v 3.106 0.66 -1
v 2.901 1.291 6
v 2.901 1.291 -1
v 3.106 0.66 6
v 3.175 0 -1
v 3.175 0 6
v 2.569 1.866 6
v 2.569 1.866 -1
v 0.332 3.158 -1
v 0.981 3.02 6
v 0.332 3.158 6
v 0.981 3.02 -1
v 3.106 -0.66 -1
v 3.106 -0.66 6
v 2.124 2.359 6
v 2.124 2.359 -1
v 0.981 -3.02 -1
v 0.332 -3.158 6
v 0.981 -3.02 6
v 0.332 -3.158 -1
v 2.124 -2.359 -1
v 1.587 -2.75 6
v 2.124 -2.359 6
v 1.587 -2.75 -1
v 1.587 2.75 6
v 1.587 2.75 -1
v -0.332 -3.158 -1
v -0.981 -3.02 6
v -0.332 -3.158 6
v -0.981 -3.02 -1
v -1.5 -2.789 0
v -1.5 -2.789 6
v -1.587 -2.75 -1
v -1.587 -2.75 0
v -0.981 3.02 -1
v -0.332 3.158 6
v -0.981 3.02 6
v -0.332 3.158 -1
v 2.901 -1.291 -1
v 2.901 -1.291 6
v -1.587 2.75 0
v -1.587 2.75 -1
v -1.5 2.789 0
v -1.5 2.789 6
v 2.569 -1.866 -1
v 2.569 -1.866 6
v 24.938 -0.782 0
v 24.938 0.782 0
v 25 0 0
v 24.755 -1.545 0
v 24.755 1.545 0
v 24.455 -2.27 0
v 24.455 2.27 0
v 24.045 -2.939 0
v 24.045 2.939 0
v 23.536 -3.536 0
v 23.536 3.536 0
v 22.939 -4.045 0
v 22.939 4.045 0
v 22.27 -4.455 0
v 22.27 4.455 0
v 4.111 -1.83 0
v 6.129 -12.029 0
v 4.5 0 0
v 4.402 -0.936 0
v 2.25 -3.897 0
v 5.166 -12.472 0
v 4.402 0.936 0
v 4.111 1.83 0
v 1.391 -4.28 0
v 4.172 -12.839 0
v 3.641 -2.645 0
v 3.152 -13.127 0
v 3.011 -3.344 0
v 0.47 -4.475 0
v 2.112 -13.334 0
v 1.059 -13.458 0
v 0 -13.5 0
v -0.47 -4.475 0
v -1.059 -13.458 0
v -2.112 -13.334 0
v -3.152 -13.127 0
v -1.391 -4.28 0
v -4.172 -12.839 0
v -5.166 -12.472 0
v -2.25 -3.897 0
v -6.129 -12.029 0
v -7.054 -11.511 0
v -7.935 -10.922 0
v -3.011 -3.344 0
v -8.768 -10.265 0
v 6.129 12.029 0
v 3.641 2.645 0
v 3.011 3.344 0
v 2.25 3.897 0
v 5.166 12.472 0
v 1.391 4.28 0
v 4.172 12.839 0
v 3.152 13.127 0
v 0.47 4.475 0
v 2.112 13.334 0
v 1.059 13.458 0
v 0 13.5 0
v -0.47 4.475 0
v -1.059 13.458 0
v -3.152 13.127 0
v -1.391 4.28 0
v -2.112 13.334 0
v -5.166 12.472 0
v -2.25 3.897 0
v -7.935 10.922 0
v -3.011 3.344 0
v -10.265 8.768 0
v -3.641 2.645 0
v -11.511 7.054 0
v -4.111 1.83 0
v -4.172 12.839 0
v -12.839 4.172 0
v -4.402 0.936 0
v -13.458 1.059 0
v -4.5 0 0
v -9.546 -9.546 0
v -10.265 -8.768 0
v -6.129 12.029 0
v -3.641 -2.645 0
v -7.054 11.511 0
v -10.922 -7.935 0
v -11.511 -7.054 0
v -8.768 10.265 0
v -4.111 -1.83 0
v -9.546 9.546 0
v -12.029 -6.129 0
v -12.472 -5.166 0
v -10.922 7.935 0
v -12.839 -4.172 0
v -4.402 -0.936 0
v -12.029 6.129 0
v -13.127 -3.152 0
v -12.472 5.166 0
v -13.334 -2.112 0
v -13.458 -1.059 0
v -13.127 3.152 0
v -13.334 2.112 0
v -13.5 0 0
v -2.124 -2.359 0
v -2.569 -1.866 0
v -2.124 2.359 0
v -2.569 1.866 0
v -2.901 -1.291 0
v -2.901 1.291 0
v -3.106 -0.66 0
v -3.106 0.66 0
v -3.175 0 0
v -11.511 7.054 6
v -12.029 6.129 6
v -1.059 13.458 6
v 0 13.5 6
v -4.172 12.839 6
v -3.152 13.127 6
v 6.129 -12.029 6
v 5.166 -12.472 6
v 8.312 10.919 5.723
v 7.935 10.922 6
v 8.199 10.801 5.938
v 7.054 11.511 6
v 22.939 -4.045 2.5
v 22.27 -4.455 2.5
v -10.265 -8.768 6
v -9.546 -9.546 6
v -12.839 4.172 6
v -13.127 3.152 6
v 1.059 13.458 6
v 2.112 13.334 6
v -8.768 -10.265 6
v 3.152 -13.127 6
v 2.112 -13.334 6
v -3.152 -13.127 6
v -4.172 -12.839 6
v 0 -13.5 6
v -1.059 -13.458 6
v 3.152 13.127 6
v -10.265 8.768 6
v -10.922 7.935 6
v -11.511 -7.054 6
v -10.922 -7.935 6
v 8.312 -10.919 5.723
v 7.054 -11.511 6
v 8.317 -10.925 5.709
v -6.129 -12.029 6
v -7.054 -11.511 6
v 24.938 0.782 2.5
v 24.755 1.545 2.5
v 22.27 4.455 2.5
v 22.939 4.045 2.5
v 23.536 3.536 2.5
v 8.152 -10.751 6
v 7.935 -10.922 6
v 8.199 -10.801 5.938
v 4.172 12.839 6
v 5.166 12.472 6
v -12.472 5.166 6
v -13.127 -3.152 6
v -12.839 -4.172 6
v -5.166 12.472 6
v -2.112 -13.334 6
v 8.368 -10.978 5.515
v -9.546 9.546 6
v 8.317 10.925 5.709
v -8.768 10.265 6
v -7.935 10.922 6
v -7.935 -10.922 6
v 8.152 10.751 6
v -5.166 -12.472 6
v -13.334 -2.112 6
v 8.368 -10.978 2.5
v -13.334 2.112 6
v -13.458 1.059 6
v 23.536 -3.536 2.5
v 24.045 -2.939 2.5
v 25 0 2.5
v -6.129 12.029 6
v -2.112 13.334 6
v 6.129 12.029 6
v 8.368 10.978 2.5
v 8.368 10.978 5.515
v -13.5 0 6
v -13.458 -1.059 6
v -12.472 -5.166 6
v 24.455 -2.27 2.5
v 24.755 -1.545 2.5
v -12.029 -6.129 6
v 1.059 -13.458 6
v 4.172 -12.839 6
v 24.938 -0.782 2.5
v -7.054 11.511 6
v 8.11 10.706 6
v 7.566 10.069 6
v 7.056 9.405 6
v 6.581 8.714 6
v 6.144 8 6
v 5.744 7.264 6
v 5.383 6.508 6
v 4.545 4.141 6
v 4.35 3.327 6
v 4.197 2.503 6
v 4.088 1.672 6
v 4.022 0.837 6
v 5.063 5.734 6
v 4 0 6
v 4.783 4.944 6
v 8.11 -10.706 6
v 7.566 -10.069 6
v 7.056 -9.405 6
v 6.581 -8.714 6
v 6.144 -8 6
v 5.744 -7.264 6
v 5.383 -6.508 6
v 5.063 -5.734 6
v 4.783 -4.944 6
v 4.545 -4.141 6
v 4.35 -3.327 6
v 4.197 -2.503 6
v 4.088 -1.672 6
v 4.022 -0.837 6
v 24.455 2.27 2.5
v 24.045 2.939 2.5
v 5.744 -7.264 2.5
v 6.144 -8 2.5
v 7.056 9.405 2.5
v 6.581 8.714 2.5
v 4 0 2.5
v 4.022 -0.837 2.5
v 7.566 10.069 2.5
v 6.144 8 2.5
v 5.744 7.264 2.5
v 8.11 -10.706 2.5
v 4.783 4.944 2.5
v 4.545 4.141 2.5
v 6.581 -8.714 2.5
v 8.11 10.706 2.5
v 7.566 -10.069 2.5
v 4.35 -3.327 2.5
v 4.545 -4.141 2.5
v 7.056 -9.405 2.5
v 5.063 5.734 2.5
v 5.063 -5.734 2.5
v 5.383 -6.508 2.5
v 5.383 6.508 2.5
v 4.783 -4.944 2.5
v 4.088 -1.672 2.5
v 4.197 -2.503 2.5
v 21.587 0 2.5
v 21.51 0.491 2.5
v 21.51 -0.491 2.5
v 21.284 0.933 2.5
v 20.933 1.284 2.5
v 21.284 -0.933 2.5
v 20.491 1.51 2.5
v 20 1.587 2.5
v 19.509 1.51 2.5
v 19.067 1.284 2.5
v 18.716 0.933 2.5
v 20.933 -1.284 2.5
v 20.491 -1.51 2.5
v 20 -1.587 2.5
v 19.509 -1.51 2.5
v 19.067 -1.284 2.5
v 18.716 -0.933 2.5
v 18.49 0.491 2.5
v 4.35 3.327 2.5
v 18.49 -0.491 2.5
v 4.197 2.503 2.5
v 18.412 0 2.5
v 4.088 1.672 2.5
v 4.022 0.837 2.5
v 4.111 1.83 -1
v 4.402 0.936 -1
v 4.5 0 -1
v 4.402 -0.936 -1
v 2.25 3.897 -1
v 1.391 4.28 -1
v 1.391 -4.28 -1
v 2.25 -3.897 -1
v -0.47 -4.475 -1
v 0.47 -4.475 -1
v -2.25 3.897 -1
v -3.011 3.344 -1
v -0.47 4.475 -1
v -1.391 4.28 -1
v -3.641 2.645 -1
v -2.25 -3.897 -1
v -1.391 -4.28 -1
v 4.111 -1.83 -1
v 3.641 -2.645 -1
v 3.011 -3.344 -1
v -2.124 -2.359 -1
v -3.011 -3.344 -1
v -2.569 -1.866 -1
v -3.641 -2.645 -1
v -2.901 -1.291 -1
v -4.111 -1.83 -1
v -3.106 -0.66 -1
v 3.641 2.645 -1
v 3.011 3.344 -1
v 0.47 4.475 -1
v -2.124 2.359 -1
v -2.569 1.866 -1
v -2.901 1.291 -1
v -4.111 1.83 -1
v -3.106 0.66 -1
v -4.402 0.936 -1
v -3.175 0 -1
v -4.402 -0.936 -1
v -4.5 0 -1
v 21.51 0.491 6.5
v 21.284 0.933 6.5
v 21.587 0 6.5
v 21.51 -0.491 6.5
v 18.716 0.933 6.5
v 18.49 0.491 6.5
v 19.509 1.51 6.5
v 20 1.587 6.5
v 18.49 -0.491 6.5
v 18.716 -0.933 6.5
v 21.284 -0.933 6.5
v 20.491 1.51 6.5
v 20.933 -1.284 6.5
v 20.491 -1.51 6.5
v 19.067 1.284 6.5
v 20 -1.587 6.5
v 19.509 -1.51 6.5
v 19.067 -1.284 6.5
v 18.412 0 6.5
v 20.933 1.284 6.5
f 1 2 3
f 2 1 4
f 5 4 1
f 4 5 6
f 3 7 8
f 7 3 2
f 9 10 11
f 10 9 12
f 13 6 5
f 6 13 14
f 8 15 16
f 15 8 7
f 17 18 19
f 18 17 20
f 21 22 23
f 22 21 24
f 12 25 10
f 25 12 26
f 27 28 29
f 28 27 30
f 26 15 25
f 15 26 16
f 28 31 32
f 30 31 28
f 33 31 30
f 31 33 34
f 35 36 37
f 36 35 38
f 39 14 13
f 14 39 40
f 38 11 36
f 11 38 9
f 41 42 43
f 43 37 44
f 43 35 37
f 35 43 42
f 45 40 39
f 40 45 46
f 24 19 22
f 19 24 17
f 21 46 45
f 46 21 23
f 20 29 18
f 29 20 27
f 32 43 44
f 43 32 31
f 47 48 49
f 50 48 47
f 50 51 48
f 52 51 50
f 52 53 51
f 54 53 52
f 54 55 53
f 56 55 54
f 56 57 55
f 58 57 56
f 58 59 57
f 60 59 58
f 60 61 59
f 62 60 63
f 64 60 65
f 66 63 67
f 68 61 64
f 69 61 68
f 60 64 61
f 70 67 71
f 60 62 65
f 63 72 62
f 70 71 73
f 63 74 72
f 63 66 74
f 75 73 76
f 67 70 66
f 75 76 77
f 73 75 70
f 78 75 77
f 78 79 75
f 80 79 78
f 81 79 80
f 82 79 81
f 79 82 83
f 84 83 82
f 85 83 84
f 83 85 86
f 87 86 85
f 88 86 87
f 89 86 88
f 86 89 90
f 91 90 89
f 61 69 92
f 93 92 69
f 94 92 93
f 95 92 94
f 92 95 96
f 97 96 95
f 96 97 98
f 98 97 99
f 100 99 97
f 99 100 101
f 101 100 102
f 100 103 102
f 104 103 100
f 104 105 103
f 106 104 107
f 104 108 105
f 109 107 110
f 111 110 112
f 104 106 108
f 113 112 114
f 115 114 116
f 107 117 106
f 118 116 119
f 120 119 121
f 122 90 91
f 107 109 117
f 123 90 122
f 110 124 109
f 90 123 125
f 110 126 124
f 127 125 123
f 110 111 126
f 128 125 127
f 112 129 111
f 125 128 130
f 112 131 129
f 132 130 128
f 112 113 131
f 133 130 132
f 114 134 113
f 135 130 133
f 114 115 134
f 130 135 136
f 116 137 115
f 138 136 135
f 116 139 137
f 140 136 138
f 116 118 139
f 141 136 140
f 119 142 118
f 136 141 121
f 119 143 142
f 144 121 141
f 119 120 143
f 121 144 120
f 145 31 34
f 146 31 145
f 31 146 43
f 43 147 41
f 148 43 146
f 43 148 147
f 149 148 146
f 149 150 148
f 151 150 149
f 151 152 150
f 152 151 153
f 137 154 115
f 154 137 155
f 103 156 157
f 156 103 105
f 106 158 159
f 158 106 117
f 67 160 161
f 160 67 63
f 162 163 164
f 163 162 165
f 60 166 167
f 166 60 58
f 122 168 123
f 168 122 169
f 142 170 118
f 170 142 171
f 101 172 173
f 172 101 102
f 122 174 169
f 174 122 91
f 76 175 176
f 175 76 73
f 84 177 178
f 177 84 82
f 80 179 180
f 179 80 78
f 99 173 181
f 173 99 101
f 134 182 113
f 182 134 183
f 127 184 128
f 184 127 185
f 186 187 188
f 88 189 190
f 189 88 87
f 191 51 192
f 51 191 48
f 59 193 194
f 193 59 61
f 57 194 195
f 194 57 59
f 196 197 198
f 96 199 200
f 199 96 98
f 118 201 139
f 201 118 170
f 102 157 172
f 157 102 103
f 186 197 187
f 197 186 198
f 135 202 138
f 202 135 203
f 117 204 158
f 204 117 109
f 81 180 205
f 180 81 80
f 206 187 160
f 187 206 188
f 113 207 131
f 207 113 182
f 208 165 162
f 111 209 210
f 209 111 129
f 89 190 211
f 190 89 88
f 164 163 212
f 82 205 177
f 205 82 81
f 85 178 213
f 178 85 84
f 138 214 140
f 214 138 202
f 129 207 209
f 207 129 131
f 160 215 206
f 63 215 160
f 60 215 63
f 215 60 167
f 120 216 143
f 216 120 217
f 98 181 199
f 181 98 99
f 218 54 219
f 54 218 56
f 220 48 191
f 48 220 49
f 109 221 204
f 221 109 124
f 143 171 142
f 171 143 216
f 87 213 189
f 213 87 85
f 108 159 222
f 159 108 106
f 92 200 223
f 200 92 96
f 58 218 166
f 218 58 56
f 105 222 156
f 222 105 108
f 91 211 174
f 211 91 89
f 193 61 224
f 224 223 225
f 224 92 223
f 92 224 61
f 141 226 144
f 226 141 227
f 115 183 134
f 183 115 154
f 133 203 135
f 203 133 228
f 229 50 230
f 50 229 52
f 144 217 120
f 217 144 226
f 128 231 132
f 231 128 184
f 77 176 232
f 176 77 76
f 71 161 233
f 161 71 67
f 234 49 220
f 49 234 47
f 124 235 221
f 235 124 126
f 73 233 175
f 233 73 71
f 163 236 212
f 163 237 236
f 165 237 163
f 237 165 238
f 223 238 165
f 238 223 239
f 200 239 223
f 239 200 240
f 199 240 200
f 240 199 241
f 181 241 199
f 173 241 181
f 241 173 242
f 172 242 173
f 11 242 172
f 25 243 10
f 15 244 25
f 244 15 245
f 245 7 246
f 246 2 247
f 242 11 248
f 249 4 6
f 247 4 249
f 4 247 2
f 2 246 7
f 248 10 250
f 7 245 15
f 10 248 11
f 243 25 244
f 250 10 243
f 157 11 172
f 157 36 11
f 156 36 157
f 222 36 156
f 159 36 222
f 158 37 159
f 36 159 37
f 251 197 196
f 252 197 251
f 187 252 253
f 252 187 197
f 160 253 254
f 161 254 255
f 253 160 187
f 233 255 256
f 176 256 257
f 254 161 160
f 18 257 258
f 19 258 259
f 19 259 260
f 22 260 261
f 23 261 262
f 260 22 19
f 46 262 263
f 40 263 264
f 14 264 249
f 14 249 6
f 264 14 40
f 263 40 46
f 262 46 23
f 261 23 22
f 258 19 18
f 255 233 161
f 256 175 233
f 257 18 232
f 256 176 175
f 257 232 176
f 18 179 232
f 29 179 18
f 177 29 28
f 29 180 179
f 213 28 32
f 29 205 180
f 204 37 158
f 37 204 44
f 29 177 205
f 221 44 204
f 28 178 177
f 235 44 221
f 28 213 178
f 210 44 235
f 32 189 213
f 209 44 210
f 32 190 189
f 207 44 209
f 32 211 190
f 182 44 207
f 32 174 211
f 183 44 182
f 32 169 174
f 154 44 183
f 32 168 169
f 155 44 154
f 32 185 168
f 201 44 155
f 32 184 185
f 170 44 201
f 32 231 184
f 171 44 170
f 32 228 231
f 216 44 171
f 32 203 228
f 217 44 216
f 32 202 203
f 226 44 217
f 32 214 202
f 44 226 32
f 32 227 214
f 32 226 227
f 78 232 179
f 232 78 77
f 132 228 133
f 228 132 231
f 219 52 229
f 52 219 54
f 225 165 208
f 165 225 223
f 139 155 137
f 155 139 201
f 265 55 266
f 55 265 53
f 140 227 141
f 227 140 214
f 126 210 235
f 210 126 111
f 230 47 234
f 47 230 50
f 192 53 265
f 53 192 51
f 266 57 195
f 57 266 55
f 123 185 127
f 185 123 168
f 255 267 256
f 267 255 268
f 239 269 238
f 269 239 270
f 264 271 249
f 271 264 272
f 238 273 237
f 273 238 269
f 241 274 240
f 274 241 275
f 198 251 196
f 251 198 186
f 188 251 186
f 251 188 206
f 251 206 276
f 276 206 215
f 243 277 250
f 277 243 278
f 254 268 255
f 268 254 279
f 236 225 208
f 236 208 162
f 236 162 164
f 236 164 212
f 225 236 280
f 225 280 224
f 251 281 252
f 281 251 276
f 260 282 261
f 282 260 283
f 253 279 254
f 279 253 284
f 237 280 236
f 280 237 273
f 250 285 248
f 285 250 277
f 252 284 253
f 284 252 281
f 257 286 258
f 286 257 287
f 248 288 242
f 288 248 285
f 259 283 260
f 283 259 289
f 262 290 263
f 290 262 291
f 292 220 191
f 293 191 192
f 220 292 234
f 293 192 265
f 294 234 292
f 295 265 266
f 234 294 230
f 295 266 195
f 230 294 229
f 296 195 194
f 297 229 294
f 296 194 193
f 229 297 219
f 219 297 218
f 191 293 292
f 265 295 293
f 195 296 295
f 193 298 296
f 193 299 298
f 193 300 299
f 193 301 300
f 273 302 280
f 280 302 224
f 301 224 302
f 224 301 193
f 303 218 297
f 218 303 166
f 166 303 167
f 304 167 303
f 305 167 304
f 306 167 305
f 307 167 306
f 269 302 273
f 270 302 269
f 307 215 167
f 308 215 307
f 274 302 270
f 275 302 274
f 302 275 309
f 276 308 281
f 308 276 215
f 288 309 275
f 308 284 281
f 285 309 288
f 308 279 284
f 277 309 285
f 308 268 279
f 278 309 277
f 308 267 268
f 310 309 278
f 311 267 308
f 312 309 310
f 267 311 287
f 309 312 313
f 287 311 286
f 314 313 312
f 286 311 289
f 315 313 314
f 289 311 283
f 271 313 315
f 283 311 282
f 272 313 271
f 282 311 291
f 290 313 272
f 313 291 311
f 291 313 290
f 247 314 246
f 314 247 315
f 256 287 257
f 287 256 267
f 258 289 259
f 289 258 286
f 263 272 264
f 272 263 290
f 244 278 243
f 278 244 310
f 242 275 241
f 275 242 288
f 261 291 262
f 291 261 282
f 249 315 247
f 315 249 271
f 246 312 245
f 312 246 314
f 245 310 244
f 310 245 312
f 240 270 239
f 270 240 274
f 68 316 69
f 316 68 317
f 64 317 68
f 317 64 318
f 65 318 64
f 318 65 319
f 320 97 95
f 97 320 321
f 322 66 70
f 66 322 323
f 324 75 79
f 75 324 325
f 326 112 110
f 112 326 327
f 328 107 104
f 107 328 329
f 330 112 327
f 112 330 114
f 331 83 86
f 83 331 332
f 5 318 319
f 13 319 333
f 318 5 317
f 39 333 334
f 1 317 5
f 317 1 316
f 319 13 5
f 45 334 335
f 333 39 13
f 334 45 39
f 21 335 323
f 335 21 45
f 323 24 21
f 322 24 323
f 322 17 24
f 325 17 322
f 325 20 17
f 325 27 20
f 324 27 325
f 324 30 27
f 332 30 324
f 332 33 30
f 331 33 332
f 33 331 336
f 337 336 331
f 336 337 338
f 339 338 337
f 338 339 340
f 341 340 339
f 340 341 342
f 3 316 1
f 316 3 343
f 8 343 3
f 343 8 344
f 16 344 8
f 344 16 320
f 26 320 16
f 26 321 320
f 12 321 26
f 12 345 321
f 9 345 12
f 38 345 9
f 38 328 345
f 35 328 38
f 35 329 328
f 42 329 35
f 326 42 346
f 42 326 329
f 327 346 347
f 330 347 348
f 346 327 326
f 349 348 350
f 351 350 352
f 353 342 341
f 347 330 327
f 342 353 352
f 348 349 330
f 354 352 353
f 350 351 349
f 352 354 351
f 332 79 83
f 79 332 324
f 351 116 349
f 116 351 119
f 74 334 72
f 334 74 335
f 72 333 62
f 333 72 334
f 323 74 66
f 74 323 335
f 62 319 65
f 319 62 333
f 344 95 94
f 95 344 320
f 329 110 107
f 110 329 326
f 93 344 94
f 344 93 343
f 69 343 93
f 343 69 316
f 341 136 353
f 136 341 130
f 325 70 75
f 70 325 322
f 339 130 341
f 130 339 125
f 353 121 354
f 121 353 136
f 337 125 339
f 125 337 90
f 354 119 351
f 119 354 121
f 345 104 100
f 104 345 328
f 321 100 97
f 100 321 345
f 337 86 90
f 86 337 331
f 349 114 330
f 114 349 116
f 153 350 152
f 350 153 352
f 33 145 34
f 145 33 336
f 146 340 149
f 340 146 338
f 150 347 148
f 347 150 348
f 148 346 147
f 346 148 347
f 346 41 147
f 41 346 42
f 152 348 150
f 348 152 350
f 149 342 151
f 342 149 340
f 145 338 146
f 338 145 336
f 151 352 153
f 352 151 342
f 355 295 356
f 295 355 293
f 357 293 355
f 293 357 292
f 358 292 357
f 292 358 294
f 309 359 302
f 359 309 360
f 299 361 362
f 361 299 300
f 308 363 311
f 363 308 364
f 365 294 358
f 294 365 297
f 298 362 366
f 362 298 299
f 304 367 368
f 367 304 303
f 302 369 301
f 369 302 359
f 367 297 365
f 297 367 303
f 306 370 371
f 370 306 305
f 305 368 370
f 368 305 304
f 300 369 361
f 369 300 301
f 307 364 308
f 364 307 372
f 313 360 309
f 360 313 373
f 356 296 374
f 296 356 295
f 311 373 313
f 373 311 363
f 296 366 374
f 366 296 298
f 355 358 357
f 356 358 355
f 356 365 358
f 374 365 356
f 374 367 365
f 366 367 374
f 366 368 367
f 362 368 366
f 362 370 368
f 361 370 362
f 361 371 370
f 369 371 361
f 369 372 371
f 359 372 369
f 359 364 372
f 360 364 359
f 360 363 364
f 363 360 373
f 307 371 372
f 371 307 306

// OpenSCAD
union() {
    difference() {
        hull() {
            translate([20,0,0]) cylinder(2.5, d=10, $fn=40);
            cylinder(6, d=27, $fn=80);
        }
        translate([20, 0, 2.5]) cylinder(6.5, r=16, $fn=120);
        difference() {
            cylinder(20, d=6.35, center=true, $fn=30);
            translate([-11.5 , -3, 0]) cube([10, 6, 10]);
        }
    }
    translate([20, 0, 0]) cylinder(6.5, d=3.175, $fn=20);
    difference() {
        translate([0, 0, -1]) cylinder(2, d=9, $fn=30);
        cylinder(5, d=6.35, center=true, $fn=30);
    }
}
